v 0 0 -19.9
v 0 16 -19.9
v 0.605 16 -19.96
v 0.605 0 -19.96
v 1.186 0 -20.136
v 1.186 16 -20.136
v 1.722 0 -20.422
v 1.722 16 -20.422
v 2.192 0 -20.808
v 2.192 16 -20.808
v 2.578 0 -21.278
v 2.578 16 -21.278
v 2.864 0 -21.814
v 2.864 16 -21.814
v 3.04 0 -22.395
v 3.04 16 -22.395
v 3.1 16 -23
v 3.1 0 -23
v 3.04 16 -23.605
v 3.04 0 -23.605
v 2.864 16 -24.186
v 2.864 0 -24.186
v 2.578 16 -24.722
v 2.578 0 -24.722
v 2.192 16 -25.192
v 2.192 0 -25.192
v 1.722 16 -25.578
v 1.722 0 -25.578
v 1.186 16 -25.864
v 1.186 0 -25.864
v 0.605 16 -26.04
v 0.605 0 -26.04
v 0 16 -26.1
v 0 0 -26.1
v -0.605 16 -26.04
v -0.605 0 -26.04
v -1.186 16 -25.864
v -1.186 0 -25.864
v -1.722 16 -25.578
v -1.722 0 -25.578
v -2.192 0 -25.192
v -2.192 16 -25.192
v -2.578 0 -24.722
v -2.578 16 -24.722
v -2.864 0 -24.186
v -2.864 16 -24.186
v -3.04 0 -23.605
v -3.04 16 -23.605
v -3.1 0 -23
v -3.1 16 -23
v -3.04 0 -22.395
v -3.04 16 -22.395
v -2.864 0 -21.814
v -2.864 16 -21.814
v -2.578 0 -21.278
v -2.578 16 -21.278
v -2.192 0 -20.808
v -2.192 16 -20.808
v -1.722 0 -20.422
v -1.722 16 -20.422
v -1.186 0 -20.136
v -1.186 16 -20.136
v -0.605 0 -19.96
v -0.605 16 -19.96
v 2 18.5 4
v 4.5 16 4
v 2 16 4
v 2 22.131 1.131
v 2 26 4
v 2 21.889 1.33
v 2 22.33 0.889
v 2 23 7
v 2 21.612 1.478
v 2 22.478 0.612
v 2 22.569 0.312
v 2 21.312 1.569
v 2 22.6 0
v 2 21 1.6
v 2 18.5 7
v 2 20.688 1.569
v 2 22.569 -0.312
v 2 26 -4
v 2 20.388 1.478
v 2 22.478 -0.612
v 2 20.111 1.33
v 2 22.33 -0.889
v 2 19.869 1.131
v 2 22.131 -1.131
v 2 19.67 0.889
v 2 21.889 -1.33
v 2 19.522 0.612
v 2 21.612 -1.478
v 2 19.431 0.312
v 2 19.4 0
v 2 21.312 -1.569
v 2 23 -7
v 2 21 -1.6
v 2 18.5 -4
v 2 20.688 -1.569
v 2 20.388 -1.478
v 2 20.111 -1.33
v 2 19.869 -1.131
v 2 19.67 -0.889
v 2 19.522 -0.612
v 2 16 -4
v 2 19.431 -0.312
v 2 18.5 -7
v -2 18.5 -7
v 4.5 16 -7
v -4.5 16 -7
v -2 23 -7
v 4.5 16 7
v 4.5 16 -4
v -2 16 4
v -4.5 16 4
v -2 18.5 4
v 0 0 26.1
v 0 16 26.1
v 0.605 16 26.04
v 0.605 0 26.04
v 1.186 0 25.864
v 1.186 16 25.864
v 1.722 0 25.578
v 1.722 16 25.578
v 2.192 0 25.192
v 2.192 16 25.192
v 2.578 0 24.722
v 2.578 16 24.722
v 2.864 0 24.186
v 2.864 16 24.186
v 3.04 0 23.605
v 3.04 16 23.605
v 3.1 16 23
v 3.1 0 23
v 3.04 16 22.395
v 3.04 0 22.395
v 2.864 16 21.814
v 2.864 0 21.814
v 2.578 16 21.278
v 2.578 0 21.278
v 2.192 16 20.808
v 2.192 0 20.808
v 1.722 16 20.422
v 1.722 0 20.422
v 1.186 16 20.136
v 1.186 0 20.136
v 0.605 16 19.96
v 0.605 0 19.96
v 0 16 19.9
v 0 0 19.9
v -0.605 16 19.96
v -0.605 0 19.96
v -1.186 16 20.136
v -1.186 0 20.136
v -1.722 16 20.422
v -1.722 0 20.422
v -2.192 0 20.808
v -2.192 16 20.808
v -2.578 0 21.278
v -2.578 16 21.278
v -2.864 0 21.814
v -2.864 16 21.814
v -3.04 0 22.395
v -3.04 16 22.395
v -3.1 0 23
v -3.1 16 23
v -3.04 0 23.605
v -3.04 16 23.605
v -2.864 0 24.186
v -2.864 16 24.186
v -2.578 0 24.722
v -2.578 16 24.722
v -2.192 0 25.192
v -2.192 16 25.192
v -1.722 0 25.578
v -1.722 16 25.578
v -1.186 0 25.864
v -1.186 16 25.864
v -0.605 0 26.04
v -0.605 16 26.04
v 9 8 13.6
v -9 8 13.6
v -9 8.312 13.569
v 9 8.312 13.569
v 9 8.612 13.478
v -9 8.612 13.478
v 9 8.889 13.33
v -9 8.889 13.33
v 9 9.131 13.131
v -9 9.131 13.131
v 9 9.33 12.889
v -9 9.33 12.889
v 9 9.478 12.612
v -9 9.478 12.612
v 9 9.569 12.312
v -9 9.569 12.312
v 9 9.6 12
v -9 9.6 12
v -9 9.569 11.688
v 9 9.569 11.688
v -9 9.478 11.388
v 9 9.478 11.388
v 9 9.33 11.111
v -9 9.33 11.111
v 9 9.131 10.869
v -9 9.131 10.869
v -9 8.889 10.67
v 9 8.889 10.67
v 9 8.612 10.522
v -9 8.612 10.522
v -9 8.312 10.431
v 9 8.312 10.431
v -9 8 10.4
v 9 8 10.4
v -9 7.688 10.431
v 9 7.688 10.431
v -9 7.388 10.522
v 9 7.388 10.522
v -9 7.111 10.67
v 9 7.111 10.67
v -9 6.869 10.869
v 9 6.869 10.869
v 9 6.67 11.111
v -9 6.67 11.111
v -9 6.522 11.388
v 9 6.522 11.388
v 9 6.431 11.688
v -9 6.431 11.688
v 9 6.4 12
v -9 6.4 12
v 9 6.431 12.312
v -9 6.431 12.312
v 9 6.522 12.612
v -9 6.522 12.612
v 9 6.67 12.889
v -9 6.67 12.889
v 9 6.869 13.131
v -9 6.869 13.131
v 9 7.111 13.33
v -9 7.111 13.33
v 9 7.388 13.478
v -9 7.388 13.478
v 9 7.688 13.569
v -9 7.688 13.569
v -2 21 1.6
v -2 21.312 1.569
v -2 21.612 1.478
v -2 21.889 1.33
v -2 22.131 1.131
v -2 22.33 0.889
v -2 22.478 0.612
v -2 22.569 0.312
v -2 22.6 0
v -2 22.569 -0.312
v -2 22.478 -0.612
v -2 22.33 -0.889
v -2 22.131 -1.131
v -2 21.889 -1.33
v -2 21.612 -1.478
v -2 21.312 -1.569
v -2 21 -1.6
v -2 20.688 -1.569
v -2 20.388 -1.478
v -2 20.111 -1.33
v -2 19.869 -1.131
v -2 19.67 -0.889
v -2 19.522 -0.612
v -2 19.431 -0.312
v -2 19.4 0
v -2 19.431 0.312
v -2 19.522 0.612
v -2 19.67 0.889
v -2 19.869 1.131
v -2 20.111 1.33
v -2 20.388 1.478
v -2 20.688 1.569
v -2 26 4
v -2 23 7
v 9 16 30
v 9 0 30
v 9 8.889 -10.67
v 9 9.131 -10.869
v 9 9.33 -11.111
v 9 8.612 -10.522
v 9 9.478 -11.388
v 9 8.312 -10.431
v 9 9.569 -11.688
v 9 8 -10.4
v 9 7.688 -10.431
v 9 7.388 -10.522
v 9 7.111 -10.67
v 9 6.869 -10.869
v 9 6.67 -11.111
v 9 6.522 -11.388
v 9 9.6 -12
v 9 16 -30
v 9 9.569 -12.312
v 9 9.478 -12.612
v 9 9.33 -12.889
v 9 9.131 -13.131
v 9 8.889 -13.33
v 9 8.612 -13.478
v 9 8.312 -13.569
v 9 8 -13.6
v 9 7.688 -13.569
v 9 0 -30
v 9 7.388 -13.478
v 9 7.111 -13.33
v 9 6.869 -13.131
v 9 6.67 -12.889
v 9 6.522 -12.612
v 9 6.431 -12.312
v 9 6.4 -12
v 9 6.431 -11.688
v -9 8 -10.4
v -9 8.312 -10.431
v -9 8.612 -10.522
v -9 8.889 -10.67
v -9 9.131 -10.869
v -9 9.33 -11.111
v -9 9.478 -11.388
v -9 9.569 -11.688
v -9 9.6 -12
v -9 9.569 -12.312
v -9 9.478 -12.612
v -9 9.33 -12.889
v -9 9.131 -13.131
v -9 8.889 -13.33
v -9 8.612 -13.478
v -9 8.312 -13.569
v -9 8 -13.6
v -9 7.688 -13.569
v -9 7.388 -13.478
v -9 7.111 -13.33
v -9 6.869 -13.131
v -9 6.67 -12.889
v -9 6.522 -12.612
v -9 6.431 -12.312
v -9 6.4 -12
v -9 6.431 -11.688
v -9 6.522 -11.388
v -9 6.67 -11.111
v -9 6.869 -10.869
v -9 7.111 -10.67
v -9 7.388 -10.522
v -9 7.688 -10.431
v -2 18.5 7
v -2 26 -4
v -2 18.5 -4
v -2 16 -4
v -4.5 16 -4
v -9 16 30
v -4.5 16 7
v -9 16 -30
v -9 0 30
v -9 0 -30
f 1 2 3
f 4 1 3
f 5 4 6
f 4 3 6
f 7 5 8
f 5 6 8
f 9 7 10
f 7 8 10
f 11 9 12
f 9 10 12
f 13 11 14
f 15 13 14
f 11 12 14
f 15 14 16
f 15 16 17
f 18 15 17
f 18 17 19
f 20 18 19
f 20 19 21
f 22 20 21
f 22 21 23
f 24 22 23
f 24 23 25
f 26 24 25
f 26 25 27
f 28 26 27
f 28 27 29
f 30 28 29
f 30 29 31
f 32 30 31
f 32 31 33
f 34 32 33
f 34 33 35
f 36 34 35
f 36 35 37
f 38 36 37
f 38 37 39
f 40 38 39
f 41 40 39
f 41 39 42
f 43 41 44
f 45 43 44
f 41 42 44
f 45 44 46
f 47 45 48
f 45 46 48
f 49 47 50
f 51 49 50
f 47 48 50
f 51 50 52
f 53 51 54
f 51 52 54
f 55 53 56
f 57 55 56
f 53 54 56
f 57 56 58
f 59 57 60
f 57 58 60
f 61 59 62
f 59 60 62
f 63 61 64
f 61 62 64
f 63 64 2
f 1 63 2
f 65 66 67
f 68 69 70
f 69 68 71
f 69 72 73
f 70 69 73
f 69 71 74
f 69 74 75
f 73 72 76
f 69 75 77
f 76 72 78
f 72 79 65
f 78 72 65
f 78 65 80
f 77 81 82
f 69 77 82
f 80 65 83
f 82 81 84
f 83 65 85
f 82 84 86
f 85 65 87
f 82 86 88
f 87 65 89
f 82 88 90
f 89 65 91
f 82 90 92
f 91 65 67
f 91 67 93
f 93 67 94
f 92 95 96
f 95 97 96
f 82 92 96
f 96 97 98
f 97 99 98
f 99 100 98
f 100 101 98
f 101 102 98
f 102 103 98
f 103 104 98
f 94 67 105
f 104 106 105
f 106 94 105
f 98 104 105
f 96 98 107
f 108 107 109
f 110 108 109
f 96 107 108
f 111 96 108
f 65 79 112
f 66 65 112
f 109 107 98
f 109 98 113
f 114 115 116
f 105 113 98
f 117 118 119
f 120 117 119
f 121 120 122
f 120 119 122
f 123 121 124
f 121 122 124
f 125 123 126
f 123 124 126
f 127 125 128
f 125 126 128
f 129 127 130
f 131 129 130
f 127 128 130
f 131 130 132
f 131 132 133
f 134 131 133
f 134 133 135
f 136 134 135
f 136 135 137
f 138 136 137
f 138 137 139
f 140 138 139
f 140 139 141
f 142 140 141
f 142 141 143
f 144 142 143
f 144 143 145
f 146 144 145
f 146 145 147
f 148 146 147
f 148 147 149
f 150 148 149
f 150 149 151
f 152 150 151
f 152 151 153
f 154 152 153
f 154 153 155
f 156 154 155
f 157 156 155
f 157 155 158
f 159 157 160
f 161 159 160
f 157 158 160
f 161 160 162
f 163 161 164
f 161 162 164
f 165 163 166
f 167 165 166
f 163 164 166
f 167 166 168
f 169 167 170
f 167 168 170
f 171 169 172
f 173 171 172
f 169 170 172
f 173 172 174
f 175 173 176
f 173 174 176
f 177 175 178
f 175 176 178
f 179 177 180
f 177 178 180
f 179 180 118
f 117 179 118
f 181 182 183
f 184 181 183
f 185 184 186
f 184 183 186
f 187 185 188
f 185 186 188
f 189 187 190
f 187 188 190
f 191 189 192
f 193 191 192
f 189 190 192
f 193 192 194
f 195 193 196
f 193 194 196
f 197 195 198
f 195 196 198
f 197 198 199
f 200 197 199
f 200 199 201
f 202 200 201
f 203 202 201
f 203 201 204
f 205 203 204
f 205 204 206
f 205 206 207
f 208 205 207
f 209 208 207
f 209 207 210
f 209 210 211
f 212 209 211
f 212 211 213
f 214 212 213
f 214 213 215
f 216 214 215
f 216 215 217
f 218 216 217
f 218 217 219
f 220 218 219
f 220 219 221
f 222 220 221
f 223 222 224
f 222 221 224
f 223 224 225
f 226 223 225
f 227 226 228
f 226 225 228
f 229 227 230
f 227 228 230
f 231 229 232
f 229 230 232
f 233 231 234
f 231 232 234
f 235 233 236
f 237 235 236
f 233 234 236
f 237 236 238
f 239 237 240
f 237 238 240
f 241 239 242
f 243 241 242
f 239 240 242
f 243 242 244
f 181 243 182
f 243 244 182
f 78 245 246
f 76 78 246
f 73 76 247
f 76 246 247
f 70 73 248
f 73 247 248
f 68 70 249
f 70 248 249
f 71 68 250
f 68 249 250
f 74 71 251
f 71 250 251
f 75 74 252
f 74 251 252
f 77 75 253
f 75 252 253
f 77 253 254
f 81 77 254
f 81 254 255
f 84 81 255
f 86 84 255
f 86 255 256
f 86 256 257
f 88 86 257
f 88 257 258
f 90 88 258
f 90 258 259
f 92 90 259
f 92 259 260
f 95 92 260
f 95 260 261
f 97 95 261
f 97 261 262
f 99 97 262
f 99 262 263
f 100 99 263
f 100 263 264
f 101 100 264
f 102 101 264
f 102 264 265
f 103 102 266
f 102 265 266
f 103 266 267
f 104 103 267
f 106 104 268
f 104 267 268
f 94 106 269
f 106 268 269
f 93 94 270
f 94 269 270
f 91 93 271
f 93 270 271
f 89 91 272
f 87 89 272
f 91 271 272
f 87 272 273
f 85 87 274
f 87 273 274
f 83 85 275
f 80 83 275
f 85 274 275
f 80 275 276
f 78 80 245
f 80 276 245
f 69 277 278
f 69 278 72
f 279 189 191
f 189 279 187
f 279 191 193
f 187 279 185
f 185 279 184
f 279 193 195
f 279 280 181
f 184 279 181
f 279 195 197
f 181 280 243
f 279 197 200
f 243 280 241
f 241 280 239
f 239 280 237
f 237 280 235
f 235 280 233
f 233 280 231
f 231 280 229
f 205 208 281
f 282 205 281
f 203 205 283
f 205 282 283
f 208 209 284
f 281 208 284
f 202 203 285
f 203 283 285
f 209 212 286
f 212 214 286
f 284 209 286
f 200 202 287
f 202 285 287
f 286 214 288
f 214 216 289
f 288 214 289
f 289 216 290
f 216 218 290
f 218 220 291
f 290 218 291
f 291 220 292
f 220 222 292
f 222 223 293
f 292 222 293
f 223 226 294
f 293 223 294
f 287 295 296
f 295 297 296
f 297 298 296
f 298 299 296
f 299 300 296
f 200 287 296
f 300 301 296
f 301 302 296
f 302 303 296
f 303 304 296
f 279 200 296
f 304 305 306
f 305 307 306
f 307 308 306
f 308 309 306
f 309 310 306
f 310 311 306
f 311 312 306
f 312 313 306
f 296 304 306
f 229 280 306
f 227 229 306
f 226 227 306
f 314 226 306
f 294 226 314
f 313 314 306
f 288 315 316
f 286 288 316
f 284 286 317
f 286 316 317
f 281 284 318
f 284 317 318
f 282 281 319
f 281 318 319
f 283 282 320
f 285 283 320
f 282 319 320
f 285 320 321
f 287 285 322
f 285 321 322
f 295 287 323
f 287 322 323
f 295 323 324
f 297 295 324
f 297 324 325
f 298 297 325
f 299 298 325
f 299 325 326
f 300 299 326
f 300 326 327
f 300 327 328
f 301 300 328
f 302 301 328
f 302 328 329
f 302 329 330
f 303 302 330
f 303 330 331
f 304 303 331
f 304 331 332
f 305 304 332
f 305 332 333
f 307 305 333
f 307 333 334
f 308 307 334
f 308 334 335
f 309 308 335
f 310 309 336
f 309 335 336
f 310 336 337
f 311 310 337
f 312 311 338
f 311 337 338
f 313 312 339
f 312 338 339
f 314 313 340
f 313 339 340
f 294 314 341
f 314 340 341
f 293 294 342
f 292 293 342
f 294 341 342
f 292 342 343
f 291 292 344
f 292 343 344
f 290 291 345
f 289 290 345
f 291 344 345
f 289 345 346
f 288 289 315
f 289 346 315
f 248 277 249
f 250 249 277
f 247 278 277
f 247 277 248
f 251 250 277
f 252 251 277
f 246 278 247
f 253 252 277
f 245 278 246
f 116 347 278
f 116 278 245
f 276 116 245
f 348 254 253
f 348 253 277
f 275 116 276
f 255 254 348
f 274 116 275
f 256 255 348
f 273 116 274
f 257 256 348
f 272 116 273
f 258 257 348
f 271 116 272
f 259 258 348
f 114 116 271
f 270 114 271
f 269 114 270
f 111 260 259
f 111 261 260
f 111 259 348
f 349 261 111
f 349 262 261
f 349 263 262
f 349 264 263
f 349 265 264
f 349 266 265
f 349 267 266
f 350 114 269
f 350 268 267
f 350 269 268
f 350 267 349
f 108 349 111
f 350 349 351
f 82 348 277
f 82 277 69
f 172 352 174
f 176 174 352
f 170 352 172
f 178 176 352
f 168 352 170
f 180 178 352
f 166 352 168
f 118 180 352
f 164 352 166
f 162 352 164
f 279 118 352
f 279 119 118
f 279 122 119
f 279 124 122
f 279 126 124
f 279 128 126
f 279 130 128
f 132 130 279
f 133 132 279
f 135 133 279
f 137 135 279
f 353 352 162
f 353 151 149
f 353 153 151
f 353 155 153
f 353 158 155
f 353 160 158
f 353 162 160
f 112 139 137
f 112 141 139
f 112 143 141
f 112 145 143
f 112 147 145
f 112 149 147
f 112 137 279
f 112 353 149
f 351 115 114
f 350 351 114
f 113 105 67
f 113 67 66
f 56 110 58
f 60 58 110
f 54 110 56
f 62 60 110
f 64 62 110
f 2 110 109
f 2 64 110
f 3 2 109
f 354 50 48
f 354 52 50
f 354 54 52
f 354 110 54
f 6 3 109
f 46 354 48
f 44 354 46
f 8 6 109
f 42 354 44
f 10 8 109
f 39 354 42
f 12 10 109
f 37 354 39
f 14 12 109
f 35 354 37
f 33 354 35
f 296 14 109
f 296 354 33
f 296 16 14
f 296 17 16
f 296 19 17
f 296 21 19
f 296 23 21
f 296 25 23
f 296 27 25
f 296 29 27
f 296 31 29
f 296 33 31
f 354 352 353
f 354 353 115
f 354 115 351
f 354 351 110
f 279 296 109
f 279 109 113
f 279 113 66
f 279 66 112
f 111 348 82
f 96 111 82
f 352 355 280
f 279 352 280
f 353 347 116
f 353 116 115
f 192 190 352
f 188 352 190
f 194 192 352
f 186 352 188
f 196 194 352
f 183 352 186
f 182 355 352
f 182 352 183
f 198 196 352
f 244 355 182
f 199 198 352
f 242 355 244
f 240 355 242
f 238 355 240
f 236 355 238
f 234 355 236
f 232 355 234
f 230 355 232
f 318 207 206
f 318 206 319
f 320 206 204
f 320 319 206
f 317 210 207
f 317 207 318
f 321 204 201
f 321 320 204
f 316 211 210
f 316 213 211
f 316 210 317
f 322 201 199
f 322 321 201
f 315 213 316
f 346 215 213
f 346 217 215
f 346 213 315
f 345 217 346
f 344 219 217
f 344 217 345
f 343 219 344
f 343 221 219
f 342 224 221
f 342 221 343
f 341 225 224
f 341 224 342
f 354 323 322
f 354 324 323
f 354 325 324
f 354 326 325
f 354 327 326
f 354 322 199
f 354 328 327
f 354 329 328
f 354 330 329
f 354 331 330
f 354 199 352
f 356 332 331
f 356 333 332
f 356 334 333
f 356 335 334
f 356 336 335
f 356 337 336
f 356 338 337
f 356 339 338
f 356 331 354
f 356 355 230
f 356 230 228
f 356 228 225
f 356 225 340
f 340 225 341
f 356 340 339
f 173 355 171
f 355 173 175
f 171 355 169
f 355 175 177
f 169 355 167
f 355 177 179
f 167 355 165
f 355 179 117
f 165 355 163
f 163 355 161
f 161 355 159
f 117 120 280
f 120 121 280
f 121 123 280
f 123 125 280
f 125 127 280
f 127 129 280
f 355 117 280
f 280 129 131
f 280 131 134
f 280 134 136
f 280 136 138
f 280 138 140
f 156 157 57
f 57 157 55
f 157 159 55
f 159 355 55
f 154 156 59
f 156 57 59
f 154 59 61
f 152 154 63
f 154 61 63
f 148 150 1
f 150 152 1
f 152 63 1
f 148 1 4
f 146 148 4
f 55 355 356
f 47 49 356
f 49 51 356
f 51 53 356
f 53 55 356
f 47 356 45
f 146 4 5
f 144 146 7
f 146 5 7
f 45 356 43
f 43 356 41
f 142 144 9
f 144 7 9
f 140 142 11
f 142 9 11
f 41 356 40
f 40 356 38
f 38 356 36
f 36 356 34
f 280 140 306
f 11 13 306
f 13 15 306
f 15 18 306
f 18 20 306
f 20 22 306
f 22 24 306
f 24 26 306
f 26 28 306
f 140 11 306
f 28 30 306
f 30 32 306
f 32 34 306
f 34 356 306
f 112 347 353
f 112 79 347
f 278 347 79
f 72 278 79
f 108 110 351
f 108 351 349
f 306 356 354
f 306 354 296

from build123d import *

# Parameters (mm, degrees)
SKETCH1_W           = 18
SKETCH1_H           = 60
BOSS_EXTRUDE1_DEPTH = 16
SKETCH2_R           = 3.1
CUT_EXTRUDE1_DEPTH  = 36.17101079
SKETCH3_R           = 1.6
CUT_EXTRUDE2_DEPTH  = 39.470768123
SKETCH4_W           = 4
SKETCH4_H           = 14
BOSS_EXTRUDE2_DEPTH = 10
SKETCH5_R           = 1.6
CUT_EXTRUDE3_DEPTH  = 42.194659848
CHAMFER1_SIZE       = 3
BOSS_EXTRUDE3_DEPTH = 3
BOSS_EXTRUDE4_DEPTH = 3


with BuildPart() as part:
    # Sketch1 → Boss-Extrude1 (new body)
    with BuildSketch(Plane(origin=(0, 0, 0), x_dir=(1, 0, 0), z_dir=(0, 1, 0))):
        Rectangle(SKETCH1_W, SKETCH1_H)
    extrude(amount=BOSS_EXTRUDE1_DEPTH)

    # Sketch2 → Cut-Extrude1 (cut, through all)
    with BuildSketch(Plane(origin=(0, 16, 0), x_dir=(1, 0, 0), z_dir=(0, 1, 0))):
        with Locations(Location((0, 23, 0), (0, 0, 270))):
            Circle(SKETCH2_R)
        with Locations(Location((0, -23, 0), (0, 0, 270))):
            Circle(SKETCH2_R)
    extrude(amount=-CUT_EXTRUDE1_DEPTH, mode=Mode.SUBTRACT)

    # Sketch3 → Cut-Extrude2 (cut, through all)
    with BuildSketch(Plane.ZY.offset(9)):
        with Locations((-12, 8)):
            Circle(SKETCH3_R)
        with Locations((12, 8)):
            Circle(SKETCH3_R)
    extrude(amount=-CUT_EXTRUDE2_DEPTH, mode=Mode.SUBTRACT)

    # Sketch4 → Boss-Extrude2 (add)
    with BuildSketch(Plane(origin=(0, 16, 0), x_dir=(1, 0, 0), z_dir=(0, 1, 0))):
        Rectangle(SKETCH4_W, SKETCH4_H)
    extrude(amount=BOSS_EXTRUDE2_DEPTH)

    # Sketch5 → Cut-Extrude3 (cut, through all)
    with BuildSketch(Plane.ZY.offset(2)):
        with Locations((0, 21)):
            Circle(SKETCH5_R)
    extrude(amount=-CUT_EXTRUDE3_DEPTH, mode=Mode.SUBTRACT)

    # Chamfer1
    chamfer1_edges = [part.edges().sort_by_distance(p)[0] for p in [
        (0, 26, -7),
        (0, 26, 7),
    ]]
    chamfer(chamfer1_edges, length=CHAMFER1_SIZE)

    # Sketch6 → Boss-Extrude3 (add)
    with BuildSketch(Plane.XY.offset(7)):
        Polygon((-2, 18.5), (-4.5, 16), (-2, 16), align=None)
        Polygon((2, 18.5), (4.5, 16), (2, 16), align=None)
    extrude(amount=-BOSS_EXTRUDE3_DEPTH)

    # Sketch7 → Boss-Extrude4 (add)
    with BuildSketch(Plane(origin=(0, 0, -7), x_dir=(-1, 0, 0), z_dir=(0, 0, -1))):
        Polygon((2, 18.5), (2, 16), (4.5, 16), align=None)
        Polygon((-2, 16), (-2, 18.5), (-4.5, 16), align=None)
    extrude(amount=-BOSS_EXTRUDE4_DEPTH)


solid = part.part
